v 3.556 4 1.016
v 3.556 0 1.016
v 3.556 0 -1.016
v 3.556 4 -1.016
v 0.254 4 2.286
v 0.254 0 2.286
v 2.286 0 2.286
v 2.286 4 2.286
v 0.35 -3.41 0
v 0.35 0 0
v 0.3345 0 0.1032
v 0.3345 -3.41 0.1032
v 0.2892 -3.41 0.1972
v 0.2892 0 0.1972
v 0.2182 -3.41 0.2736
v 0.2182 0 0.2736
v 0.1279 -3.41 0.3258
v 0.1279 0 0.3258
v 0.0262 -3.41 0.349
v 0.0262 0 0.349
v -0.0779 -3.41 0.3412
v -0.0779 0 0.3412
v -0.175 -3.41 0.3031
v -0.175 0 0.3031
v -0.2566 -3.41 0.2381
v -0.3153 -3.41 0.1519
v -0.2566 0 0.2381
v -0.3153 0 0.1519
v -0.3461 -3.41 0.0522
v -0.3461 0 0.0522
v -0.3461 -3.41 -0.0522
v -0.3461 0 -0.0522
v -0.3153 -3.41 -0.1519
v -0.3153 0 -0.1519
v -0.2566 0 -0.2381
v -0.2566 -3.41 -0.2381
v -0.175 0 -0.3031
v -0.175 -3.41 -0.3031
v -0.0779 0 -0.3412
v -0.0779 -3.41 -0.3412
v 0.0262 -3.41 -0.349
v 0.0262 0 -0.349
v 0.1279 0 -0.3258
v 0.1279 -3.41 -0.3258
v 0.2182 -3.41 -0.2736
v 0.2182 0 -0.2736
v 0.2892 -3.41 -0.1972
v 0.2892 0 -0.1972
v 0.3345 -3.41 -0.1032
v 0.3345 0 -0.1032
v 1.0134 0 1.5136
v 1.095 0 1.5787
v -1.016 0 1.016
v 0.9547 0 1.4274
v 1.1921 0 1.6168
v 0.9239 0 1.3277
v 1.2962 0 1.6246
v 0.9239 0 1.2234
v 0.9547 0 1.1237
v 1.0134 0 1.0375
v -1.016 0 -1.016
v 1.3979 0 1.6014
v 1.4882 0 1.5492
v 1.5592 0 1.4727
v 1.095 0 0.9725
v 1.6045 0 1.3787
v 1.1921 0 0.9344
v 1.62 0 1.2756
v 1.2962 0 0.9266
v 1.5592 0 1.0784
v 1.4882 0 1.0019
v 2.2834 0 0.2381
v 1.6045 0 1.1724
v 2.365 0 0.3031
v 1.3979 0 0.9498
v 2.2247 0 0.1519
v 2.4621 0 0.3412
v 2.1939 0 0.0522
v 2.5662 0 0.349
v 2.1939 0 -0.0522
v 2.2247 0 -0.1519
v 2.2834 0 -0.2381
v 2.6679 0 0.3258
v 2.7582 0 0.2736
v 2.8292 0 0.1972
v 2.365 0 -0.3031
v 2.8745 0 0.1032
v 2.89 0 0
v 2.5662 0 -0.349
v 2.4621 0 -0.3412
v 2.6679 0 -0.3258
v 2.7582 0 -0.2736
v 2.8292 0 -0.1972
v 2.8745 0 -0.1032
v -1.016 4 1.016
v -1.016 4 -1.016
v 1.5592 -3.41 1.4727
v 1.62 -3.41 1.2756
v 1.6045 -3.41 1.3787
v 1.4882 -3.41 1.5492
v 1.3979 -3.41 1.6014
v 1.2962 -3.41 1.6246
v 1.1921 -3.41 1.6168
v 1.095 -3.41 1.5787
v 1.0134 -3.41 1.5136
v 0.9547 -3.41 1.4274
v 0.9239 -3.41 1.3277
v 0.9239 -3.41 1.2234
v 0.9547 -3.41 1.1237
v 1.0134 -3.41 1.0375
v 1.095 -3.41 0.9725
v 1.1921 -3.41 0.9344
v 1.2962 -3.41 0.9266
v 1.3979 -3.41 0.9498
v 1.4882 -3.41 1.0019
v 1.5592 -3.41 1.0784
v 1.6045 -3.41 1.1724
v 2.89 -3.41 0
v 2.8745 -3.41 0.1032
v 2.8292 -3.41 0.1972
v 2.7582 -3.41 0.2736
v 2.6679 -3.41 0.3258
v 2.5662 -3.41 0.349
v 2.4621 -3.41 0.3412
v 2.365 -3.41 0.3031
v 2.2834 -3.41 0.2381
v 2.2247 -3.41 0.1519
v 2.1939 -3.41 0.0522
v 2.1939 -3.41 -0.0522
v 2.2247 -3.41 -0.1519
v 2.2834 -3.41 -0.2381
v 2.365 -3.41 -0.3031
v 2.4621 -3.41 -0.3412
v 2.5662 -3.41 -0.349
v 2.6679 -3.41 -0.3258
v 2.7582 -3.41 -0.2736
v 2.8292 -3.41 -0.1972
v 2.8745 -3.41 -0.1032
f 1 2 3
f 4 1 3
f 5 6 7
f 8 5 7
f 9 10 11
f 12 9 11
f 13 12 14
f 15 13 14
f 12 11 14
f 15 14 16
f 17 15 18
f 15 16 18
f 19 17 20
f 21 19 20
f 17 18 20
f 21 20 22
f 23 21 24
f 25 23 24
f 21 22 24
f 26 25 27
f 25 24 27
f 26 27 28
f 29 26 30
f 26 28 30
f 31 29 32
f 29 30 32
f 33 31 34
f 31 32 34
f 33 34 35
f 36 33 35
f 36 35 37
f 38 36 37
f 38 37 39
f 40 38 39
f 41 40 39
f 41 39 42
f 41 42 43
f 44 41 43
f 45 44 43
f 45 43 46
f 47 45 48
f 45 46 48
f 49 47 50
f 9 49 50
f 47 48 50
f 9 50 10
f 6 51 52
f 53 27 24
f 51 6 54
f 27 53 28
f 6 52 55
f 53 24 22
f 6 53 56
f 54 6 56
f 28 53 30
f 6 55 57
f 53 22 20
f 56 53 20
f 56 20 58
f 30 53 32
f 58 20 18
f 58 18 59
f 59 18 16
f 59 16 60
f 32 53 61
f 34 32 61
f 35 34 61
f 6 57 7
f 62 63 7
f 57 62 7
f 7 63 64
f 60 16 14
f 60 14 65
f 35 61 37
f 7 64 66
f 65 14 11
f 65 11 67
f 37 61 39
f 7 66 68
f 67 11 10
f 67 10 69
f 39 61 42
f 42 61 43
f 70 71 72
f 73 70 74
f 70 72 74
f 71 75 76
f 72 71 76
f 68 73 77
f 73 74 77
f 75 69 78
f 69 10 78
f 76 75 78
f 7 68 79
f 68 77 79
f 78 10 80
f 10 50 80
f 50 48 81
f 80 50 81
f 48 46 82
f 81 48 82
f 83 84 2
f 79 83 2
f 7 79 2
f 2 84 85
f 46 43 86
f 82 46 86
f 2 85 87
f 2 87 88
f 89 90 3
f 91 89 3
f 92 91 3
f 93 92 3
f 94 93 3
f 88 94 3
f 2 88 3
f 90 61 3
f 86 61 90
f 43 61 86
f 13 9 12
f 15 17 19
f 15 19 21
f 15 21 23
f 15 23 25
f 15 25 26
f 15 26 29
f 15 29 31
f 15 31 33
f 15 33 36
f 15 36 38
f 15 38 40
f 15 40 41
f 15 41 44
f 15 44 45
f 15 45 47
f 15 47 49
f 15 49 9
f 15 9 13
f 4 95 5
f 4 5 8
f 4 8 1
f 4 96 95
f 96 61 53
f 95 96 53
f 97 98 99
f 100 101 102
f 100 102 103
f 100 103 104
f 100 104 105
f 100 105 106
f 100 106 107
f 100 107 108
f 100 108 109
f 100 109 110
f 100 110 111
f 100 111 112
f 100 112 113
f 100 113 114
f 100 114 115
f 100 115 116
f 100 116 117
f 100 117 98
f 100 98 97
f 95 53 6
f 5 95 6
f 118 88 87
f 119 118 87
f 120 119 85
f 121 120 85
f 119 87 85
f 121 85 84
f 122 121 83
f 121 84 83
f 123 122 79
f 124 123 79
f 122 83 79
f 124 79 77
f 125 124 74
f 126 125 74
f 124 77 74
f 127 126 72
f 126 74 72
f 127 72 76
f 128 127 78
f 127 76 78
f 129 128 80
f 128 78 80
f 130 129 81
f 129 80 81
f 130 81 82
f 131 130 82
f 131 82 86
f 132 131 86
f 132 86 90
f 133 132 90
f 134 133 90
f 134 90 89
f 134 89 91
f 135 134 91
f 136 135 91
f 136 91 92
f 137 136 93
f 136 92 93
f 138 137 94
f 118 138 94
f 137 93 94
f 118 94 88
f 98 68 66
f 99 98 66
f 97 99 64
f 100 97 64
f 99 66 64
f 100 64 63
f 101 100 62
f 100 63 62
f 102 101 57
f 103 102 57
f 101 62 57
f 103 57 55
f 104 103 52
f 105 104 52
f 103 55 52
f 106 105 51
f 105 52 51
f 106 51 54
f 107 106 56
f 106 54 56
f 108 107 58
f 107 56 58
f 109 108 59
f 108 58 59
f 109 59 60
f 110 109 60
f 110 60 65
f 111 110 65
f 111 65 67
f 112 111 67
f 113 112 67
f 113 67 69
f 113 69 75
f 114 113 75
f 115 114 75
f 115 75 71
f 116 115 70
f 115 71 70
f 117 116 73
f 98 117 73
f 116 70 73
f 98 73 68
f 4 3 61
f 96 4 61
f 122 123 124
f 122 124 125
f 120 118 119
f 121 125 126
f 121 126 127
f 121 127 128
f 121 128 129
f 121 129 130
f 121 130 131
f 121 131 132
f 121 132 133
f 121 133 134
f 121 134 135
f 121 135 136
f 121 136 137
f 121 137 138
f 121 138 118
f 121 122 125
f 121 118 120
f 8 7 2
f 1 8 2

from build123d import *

# Parameters (mm, degrees)
BOSS_EXTRUDE1_DEPTH = 4
SKETCH2_R           = 0.35
BOSS_EXTRUDE2_DEPTH = 3.41


with BuildPart() as part:
    # Sketch1 → Boss-Extrude1 (new body)
    with BuildSketch(Plane(origin=(0, 0, 0), x_dir=(1, 0, 0), z_dir=(0, 1, 0))):
        Polygon((-1.016, -1.016), (0.254, -2.286), (2.286, -2.286), (3.556, -1.016), (3.556, 1.016), (-1.016, 1.016), align=None)
    extrude(amount=BOSS_EXTRUDE1_DEPTH)

    # Sketch2 → Boss-Extrude2 (add)
    with BuildSketch(Plane.XZ):
        Circle(SKETCH2_R)
        with Locations((2.54, 0)):
            Circle(SKETCH2_R)
        with Locations((1.27, 1.2755783)):
            Circle(SKETCH2_R)
    extrude(amount=BOSS_EXTRUDE2_DEPTH)


solid = part.part
